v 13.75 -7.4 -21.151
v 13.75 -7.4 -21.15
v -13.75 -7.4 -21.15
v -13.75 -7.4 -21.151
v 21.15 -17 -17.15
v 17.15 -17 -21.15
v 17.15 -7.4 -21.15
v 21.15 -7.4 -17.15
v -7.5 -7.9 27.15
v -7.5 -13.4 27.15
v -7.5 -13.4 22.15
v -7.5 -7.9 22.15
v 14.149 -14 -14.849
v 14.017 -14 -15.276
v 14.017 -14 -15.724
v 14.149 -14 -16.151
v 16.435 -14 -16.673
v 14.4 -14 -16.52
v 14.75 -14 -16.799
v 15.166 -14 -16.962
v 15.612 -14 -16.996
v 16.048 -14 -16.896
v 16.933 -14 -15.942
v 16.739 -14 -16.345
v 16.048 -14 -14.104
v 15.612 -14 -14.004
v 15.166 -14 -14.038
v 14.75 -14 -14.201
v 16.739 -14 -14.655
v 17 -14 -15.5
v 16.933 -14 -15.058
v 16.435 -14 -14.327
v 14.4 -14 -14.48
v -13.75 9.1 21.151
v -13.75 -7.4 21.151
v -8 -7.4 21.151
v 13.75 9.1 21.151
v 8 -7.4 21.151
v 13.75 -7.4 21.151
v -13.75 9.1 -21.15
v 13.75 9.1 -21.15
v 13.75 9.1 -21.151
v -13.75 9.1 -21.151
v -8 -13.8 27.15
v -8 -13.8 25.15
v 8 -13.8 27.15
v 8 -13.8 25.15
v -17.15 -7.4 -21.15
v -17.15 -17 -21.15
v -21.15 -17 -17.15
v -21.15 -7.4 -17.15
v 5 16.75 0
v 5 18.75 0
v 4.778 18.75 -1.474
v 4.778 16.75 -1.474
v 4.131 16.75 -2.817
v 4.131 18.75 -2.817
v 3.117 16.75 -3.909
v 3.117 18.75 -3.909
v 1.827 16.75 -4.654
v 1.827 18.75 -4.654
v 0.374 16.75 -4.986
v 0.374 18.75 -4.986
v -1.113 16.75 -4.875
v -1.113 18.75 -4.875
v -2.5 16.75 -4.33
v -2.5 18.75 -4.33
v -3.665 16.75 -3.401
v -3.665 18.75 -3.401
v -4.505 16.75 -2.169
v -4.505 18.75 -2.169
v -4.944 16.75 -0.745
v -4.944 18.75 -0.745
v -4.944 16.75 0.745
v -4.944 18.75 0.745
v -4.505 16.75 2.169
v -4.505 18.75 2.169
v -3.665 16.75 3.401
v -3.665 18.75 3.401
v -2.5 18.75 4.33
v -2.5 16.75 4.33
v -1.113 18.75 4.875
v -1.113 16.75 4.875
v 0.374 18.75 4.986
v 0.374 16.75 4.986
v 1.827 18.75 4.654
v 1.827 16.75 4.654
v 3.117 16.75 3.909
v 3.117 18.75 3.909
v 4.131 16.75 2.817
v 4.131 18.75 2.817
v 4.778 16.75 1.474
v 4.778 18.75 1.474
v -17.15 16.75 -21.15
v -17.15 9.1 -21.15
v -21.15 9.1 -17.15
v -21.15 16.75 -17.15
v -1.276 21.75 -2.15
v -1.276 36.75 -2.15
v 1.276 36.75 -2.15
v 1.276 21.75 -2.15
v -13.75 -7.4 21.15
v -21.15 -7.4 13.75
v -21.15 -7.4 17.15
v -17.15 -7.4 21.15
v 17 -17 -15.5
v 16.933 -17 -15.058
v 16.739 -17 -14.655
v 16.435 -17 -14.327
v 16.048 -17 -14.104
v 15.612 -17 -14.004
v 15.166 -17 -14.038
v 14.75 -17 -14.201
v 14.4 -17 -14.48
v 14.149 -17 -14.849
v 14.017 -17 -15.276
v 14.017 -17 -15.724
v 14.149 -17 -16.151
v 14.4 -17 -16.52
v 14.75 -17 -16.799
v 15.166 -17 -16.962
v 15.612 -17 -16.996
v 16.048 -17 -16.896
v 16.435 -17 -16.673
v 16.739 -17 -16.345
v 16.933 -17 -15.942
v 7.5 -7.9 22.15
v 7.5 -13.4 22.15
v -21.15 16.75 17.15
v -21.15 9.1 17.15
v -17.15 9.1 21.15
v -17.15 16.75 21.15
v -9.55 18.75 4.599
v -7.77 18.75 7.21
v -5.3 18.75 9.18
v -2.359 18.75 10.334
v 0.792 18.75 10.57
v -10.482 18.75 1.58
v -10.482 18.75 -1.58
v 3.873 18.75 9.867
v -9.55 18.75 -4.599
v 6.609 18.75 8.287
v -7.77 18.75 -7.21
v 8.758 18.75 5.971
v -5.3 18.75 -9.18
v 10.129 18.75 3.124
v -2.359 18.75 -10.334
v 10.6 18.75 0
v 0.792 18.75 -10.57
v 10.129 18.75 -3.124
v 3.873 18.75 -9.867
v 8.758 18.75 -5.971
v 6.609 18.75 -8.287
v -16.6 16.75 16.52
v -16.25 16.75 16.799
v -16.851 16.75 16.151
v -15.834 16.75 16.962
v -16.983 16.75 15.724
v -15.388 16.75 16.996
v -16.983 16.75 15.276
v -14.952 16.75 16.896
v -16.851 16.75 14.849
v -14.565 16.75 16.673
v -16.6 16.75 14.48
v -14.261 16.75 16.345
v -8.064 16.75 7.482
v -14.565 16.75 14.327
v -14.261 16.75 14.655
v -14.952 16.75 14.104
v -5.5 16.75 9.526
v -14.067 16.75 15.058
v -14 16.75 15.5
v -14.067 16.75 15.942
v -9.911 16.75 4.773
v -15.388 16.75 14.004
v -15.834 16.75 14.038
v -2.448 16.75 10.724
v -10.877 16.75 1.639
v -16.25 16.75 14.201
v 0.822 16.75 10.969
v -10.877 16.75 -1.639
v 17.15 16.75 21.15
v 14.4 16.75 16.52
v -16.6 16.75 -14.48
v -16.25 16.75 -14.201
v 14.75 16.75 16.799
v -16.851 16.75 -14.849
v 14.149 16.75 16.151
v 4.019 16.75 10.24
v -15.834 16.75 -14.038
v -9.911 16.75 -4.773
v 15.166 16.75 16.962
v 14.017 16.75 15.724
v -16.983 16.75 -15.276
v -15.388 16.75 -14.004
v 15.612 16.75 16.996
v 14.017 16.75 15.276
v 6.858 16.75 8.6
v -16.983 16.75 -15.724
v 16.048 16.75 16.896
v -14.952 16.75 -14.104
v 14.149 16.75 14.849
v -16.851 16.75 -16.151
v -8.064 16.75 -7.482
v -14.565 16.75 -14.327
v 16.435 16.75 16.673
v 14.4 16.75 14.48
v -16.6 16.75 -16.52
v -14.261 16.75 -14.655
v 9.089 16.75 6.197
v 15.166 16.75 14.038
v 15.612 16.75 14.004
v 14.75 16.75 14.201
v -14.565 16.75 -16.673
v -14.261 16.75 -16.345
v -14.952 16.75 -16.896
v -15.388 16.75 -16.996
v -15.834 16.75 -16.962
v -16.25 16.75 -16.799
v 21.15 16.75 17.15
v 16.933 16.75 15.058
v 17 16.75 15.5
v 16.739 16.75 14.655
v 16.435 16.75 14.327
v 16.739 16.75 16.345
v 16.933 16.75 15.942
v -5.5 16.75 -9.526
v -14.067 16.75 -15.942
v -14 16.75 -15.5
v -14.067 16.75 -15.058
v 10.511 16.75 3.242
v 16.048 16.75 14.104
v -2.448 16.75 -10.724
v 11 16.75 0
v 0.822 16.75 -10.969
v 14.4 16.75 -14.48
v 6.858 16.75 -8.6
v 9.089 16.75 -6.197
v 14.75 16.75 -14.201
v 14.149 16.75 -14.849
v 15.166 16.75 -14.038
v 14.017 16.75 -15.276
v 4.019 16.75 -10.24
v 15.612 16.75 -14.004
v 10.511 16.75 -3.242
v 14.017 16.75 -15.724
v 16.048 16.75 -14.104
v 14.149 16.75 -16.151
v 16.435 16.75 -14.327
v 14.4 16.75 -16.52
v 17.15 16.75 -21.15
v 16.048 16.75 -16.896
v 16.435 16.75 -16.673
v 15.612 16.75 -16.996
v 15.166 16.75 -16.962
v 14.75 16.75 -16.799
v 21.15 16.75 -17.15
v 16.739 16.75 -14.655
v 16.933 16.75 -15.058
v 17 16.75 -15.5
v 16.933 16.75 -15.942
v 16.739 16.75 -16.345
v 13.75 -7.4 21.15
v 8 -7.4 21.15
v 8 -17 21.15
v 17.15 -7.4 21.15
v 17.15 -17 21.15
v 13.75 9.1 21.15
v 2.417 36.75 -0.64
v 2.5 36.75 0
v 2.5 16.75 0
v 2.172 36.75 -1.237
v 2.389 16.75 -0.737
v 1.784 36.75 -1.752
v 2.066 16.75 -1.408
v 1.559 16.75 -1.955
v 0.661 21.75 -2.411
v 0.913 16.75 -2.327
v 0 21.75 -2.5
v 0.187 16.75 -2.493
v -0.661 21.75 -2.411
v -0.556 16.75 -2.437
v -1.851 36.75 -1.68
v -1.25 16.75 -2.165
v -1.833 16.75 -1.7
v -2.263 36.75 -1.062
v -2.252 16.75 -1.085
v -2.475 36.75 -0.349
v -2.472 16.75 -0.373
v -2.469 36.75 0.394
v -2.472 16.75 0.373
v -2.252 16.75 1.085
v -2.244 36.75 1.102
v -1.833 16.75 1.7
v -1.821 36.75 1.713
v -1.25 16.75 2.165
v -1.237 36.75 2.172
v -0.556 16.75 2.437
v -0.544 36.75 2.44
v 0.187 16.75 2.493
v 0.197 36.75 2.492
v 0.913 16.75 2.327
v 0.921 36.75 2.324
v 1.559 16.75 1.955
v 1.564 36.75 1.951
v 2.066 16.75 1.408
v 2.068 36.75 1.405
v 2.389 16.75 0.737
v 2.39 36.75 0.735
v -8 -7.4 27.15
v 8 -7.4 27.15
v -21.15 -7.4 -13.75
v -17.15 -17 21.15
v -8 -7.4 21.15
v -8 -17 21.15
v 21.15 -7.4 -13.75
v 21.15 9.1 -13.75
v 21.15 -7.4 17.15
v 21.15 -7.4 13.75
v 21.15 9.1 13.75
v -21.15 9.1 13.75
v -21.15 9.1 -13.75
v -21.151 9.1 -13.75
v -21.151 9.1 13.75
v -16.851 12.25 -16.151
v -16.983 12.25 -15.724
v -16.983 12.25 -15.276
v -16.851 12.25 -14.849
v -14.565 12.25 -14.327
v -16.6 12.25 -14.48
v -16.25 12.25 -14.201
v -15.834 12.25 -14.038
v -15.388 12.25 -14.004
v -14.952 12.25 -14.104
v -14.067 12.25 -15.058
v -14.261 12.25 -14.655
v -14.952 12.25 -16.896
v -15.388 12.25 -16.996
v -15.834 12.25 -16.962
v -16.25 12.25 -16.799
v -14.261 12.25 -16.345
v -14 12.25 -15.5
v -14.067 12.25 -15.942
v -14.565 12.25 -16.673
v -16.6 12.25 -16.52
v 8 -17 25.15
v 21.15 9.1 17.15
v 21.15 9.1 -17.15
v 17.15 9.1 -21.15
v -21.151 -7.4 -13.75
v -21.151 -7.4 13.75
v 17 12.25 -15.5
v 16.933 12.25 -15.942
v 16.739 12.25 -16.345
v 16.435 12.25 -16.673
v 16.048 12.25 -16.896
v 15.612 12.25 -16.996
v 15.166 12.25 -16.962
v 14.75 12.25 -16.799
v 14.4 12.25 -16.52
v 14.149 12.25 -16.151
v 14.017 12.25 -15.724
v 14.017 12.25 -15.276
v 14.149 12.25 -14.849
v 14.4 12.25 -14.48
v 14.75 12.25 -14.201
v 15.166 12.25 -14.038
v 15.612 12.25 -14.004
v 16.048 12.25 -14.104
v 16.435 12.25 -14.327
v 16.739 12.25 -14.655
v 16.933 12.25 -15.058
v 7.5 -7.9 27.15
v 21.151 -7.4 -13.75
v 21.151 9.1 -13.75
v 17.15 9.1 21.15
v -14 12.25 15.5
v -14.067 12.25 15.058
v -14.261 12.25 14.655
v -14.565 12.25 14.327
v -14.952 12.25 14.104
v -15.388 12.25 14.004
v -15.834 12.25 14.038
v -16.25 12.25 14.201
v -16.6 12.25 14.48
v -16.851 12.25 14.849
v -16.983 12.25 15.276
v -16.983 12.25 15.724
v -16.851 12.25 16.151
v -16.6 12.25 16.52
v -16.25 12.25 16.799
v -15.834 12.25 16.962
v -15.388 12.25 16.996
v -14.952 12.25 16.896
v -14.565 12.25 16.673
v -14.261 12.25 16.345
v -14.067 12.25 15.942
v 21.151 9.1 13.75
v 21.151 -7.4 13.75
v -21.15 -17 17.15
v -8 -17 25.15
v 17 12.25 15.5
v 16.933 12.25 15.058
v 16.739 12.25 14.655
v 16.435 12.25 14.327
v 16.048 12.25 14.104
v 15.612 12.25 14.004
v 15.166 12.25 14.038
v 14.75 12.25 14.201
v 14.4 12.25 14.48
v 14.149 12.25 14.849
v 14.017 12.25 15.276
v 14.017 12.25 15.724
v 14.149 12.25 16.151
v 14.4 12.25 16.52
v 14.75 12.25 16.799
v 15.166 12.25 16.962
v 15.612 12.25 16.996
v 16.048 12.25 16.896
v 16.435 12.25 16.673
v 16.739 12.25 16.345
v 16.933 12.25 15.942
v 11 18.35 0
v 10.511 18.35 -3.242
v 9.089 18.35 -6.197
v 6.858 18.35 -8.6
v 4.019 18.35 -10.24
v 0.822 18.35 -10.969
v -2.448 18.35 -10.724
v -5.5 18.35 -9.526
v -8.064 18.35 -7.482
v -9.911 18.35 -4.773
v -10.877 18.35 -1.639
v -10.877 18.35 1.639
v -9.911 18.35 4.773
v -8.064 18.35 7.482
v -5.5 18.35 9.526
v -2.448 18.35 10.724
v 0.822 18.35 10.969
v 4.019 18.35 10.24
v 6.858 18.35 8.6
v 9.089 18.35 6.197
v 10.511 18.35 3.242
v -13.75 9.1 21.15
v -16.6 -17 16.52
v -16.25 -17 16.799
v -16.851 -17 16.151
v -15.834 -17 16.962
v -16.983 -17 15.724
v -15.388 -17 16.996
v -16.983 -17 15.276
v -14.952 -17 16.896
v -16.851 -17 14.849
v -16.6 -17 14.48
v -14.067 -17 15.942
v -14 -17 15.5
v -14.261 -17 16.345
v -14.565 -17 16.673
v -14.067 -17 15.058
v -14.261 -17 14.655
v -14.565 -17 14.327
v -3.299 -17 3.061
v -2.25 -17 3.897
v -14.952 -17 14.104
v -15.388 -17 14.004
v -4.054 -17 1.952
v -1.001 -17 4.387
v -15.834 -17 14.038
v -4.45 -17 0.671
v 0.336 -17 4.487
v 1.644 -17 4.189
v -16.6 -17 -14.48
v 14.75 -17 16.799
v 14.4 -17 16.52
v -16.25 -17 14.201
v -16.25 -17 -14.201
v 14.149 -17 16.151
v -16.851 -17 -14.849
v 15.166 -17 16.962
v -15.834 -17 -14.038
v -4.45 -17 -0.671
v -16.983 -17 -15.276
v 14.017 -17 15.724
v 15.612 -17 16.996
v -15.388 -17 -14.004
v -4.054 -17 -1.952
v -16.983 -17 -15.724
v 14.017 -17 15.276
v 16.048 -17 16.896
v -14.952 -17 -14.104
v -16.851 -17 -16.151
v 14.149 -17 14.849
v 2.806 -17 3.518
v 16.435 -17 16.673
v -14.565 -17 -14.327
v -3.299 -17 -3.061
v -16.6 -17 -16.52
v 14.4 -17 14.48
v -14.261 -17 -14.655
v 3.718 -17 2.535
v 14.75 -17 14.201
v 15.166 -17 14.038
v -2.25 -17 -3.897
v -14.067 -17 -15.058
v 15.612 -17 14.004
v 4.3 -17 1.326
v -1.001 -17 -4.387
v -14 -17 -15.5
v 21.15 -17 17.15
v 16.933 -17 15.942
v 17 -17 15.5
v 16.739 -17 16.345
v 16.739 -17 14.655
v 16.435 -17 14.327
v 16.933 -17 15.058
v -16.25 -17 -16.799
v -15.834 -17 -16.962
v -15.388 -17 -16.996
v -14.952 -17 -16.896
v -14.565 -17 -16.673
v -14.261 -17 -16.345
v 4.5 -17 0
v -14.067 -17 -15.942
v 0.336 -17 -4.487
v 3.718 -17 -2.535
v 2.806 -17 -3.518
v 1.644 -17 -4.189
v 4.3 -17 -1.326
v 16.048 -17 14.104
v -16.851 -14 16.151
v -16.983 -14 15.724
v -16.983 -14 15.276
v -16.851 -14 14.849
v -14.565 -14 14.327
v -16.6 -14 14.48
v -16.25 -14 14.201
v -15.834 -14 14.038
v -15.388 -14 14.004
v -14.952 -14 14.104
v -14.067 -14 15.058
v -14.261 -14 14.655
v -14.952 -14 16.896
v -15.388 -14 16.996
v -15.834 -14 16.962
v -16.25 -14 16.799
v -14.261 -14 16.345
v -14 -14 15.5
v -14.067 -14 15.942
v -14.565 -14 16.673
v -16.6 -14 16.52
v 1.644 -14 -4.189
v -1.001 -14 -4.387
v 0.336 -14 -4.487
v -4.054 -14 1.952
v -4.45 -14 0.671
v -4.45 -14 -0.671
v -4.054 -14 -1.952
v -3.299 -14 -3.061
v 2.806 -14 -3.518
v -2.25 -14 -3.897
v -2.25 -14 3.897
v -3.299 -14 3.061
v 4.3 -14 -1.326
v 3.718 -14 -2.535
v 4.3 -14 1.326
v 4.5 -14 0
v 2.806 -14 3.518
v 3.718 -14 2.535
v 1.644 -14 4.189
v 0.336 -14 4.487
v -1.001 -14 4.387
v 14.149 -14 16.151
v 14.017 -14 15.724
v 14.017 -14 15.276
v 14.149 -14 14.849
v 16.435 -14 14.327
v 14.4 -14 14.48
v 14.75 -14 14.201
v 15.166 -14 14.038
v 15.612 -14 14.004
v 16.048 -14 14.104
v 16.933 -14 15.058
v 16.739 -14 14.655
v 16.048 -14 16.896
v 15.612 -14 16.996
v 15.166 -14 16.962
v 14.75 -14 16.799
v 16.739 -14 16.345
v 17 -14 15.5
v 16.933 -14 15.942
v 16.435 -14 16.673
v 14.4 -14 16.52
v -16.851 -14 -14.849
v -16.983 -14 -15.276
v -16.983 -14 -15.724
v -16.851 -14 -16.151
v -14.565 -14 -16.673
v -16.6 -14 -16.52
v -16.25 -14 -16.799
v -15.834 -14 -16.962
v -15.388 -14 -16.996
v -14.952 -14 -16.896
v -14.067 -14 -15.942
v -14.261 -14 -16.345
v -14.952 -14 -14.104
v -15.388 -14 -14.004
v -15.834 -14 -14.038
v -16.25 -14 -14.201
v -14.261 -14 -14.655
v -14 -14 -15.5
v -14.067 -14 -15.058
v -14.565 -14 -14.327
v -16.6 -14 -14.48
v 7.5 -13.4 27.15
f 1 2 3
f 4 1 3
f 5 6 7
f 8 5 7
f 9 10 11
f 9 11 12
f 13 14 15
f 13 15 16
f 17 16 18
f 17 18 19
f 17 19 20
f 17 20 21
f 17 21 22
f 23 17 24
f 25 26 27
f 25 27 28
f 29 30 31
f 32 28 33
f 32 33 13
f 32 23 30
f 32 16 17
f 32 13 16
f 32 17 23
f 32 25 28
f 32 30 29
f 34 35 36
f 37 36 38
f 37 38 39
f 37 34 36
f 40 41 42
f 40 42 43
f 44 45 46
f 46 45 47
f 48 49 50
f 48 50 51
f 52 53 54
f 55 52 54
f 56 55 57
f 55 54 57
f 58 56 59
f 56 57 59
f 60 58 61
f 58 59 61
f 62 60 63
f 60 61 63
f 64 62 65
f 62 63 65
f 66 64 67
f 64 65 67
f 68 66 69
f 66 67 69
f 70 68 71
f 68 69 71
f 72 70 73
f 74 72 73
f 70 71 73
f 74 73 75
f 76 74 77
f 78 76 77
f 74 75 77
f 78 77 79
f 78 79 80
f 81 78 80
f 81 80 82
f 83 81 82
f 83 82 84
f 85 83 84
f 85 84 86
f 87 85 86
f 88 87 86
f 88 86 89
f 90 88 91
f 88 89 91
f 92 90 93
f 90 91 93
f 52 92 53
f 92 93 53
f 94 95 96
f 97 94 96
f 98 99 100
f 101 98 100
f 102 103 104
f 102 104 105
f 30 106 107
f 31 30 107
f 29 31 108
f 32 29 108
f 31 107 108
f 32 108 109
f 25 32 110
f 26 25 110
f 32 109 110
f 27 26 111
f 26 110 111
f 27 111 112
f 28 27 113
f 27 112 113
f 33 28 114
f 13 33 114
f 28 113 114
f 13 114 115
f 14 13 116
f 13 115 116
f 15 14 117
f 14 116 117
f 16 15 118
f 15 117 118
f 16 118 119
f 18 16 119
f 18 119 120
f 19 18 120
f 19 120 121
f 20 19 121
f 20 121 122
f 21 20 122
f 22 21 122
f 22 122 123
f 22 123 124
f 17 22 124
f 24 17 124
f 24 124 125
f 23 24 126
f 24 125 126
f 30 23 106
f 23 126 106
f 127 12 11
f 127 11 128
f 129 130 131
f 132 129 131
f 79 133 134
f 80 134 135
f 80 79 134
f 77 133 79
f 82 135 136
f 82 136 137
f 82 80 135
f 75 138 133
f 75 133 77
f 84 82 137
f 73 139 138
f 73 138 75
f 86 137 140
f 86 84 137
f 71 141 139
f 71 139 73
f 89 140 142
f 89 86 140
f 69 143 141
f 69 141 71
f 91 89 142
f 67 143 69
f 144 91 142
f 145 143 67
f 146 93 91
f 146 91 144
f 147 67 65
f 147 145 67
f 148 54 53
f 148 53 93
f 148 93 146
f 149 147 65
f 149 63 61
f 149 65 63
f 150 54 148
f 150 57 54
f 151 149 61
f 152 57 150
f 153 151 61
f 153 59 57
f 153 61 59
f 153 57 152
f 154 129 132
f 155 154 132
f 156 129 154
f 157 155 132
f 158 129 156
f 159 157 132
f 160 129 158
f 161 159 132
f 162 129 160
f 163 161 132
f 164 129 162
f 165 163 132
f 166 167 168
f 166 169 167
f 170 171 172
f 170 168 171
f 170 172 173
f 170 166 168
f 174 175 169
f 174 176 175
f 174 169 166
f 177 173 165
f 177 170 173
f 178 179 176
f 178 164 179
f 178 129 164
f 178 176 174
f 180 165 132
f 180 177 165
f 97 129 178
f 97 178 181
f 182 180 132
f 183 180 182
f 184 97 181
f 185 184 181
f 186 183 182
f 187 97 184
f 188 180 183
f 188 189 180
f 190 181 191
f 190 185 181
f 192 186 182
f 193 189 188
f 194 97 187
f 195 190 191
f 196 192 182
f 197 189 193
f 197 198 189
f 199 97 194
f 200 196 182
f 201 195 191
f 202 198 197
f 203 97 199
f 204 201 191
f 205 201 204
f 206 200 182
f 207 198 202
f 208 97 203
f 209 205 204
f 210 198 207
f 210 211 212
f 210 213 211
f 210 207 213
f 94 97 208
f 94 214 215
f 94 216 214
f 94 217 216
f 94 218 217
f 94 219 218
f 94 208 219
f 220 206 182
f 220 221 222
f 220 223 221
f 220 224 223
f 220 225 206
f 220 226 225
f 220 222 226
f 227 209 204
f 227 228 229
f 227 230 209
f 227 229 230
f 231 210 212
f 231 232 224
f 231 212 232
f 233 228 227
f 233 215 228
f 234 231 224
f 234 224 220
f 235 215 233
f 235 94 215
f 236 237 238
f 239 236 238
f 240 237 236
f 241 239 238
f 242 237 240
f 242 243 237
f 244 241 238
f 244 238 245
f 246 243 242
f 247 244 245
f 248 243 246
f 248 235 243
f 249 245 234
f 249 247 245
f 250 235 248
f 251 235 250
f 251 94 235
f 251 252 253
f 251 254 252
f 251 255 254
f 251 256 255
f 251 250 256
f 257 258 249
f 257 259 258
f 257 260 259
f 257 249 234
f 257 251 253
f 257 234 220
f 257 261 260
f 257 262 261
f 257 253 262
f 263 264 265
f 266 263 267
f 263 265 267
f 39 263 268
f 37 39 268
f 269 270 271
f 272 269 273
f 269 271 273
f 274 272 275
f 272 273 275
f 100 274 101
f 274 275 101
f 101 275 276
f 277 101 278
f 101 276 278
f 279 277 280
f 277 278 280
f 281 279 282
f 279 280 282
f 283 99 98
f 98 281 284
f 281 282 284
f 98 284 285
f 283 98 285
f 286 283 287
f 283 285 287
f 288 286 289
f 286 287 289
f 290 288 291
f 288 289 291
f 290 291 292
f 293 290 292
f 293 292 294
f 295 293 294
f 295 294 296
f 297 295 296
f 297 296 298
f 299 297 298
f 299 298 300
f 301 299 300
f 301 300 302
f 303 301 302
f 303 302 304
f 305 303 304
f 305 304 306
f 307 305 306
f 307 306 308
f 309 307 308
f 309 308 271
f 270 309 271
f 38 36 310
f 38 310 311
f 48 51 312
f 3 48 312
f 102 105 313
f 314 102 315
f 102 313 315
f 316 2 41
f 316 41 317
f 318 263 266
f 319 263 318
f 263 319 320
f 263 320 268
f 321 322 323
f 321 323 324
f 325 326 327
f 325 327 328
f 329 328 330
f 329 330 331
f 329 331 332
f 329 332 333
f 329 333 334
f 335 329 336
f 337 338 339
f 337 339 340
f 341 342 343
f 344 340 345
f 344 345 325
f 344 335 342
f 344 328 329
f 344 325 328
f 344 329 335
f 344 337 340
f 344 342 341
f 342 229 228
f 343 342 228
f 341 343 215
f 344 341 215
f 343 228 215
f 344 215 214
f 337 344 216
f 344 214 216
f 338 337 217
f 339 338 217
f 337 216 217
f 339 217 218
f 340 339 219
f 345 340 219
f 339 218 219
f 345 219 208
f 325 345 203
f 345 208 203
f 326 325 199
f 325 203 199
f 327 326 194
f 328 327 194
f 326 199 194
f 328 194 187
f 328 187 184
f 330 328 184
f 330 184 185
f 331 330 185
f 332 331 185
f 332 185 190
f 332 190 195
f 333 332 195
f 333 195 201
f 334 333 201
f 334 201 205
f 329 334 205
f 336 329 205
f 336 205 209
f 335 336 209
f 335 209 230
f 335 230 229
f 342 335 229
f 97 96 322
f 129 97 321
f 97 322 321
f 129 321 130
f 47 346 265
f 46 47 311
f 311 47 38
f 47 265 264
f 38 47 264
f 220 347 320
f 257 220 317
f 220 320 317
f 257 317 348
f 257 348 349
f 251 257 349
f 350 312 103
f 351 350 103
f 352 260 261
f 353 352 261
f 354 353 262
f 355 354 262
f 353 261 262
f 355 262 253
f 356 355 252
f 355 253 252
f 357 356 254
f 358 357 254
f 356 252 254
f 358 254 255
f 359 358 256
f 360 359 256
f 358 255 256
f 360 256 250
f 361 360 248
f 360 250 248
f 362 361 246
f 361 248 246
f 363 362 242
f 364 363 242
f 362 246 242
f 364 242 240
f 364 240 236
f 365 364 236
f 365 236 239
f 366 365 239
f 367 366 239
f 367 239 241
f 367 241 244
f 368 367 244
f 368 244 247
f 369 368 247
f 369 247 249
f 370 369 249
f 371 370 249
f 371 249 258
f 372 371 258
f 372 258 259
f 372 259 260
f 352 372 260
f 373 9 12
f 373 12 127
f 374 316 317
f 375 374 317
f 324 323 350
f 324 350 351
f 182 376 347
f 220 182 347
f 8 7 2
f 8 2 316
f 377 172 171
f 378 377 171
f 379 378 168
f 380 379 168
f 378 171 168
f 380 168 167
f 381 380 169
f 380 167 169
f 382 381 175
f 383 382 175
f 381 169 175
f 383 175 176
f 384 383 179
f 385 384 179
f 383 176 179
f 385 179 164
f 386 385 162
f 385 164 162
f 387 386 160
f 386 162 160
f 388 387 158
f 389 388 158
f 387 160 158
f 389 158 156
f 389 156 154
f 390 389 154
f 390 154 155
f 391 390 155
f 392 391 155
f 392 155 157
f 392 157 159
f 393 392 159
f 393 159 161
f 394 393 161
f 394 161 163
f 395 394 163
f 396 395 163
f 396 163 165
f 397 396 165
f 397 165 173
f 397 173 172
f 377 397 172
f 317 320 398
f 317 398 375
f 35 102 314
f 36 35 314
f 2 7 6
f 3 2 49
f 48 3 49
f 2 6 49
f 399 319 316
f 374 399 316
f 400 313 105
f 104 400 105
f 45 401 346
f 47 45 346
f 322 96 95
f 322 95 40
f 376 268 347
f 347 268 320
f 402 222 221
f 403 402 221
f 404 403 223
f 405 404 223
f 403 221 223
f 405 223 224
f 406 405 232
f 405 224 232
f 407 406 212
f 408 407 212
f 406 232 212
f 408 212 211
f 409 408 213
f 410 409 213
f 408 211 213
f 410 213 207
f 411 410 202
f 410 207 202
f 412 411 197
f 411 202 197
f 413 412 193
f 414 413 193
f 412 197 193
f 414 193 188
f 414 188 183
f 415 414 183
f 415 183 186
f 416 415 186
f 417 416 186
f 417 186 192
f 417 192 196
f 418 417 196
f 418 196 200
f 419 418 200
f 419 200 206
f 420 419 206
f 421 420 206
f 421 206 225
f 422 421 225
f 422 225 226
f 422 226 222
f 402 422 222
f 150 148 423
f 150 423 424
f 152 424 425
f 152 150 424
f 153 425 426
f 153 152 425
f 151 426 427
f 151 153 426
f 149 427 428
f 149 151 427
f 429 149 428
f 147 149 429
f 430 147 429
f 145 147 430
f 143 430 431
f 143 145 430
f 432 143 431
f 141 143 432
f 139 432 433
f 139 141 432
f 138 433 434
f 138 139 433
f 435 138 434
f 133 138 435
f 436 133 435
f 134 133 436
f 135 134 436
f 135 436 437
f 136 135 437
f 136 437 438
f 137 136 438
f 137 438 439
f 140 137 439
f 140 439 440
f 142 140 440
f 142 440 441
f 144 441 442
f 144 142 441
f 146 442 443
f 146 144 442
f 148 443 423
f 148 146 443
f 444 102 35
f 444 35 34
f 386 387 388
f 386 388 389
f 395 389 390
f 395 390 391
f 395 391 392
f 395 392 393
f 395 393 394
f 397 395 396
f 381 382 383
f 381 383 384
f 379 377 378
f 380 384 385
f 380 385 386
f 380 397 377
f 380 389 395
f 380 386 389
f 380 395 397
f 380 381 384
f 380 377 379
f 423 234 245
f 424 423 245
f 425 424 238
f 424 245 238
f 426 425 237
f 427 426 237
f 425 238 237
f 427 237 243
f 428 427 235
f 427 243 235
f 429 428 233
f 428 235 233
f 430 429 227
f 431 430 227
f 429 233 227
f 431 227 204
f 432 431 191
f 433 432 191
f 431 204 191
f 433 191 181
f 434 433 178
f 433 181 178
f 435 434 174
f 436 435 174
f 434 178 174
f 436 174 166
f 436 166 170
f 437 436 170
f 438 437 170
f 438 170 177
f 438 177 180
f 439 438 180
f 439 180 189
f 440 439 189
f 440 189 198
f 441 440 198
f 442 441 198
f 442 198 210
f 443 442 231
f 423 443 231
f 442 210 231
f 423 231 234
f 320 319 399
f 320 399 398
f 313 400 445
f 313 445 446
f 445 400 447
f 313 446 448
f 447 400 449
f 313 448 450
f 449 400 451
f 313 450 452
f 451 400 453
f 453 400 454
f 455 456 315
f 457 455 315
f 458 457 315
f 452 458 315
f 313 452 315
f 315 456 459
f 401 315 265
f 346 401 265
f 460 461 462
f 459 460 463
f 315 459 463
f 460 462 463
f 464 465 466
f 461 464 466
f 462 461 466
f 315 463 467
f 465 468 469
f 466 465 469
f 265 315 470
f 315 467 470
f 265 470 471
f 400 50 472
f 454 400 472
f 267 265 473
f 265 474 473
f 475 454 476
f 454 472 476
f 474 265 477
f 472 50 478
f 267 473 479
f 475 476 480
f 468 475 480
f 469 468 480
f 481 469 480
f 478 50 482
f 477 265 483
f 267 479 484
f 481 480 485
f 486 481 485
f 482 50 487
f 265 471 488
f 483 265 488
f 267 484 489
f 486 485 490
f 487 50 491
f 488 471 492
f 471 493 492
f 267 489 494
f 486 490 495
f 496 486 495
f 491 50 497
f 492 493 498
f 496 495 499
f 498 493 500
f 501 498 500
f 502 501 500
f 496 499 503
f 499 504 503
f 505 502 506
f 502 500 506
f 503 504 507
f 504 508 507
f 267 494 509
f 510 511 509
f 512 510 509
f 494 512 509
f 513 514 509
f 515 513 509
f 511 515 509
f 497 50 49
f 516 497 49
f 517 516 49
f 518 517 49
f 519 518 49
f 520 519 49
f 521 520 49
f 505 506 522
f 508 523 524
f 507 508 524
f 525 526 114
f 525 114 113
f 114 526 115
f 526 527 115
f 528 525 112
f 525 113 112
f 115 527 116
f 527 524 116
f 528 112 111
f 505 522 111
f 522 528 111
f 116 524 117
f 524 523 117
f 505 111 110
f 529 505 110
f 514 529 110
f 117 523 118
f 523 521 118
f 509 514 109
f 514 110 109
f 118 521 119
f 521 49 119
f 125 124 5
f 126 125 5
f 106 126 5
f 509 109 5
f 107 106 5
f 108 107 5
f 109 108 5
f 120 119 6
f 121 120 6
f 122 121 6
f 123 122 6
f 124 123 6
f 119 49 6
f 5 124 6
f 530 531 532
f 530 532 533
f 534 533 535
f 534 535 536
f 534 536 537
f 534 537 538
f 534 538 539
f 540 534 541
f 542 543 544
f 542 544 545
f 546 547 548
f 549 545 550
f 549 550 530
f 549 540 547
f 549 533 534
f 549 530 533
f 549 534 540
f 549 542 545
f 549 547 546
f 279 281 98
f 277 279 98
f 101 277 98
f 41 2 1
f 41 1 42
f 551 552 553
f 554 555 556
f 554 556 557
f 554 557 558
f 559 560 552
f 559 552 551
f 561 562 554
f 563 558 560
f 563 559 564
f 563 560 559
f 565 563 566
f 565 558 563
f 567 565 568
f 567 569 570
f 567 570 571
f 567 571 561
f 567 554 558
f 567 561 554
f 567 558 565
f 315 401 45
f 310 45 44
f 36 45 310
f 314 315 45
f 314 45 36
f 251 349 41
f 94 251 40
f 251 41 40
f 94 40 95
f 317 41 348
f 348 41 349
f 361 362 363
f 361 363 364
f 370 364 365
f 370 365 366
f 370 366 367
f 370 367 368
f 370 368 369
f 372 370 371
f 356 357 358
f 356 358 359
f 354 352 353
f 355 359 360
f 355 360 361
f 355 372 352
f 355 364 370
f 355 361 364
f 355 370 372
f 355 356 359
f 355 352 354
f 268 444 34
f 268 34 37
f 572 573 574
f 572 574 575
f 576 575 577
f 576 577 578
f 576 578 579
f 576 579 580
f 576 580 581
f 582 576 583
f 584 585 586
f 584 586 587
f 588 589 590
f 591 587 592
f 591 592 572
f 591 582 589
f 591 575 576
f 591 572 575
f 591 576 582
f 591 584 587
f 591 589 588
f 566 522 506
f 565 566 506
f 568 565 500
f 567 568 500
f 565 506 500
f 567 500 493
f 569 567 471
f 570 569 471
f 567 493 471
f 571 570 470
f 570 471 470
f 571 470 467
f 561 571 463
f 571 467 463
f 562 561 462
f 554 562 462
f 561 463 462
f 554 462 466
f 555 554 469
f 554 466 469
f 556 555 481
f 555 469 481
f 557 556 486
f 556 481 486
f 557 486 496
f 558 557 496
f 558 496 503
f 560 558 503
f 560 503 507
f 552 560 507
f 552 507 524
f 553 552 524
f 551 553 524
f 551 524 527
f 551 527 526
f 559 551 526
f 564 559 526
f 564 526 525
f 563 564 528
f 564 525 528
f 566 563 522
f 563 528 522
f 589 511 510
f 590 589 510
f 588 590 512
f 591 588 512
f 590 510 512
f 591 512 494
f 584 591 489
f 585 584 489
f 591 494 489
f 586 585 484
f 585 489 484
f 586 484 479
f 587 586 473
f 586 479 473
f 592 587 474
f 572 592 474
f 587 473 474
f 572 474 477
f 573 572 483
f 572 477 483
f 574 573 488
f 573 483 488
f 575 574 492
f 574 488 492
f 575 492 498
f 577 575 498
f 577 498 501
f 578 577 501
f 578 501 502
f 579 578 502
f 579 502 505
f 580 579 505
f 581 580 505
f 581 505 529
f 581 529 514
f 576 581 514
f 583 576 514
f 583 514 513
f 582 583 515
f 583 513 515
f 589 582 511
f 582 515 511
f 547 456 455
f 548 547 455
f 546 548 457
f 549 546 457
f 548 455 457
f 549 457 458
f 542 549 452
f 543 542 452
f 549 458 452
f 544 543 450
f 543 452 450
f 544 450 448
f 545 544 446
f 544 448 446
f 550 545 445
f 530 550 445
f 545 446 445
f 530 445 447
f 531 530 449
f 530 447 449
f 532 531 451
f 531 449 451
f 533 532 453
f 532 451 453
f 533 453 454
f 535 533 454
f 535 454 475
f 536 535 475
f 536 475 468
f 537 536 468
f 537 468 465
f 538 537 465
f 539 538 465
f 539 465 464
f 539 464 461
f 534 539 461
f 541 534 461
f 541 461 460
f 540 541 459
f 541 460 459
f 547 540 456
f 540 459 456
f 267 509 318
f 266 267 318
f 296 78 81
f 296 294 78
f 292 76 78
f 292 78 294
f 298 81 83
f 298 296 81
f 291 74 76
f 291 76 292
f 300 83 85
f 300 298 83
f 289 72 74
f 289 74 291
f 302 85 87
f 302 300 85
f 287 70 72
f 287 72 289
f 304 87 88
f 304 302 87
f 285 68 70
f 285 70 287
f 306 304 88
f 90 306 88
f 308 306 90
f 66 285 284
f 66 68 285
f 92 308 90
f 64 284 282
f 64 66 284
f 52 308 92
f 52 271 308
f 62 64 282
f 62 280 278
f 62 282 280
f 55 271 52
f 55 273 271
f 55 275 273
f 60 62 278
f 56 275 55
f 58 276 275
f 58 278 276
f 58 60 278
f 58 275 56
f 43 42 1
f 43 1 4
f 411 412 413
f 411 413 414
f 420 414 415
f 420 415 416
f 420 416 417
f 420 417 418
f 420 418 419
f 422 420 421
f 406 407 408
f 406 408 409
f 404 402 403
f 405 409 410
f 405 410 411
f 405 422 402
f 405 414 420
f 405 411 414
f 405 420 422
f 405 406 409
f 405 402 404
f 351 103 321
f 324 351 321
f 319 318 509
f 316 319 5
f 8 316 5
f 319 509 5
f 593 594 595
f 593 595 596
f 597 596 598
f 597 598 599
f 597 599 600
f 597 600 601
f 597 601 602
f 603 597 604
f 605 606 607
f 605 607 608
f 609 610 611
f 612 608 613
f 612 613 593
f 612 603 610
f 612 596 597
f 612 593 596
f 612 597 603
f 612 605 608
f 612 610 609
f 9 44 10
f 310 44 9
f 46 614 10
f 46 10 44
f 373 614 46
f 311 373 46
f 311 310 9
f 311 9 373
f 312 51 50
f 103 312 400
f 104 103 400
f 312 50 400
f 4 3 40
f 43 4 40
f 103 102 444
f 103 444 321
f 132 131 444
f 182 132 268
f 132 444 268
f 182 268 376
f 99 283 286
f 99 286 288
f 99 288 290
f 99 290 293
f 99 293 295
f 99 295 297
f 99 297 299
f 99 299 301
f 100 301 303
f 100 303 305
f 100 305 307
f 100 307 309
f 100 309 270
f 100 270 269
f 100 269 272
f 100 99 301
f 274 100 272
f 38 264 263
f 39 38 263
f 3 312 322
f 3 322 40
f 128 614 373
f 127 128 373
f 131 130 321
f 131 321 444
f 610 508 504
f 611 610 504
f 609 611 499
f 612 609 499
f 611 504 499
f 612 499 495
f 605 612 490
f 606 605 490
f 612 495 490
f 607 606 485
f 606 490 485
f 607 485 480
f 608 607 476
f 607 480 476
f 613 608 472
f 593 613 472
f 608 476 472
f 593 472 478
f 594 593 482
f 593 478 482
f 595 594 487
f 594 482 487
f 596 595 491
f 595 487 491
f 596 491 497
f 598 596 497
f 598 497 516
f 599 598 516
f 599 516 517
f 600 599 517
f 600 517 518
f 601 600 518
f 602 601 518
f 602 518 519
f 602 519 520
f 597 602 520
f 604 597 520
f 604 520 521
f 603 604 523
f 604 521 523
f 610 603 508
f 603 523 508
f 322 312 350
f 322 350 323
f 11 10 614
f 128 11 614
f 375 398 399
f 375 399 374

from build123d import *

# Parameters (mm, degrees)
EXTRUDE1_START       = -17
SKETCH1_W            = 42.3
SKETCH1_H            = 42.3
EXTRUDE1_DEPTH       = 9.6
CHAMFER3_SIZE        = 4
BOSS_EXTRUDE8_DEPTH  = 16.5
BOSS_EXTRUDE9_DEPTH  = 7.65
SKETCH33_R           = 11
BOSS_EXTRUDE10_DEPTH = 2
SKETCH34_R           = 5
CUT_EXTRUDE1_DEPTH   = 2
SKETCH35_R           = 2.5
BOSS_EXTRUDE11_DEPTH = 20
CUT_EXTRUDE3_DEPTH   = 15
SKETCH37_W           = 27.5
SKETCH37_H           = 16.5
BOSS_EXTRUDE12_DEPTH = 0.001
SKETCH38_W           = 27.5
SKETCH38_H           = 16.5
BOSS_EXTRUDE13_DEPTH = 0.001
SKETCH39_W           = 27.5
SKETCH39_H           = 16.5
BOSS_EXTRUDE14_DEPTH = 0.001
SKETCH40_W           = 27.5
SKETCH40_H           = 16.5
BOSS_EXTRUDE15_DEPTH = 0.001
SKETCH41_R           = 1.5
CUT_EXTRUDE4_DEPTH   = 6
SKETCH42_R           = 4.5
SKETCH42_R_2         = 1.5
CUT_EXTRUDE5_DEPTH   = 3
SKETCH43_W           = 16
SKETCH43_H           = 4
BOSS_EXTRUDE16_DEPTH = 3.2
SKETCH44_W           = 16
SKETCH44_H           = 6.4
BOSS_EXTRUDE17_DEPTH = 6
SKETCH45_W           = 15
SKETCH45_H           = 5.5
CUT_EXTRUDE6_DEPTH   = 5
SKETCH46_R           = 1.5
BOSS_EXTRUDE18_DEPTH = 1.5
CHAMFER4_SIZE        = 0.4


with BuildPart() as part:
    # Sketch1 → Extrude1 (new body)
    with BuildSketch(Plane(origin=(0, 0, 0), x_dir=(1, 0, 0), z_dir=(0, 1, 0)).offset(EXTRUDE1_START)):
        Rectangle(SKETCH1_W, SKETCH1_H)
    extrude(amount=EXTRUDE1_DEPTH)

    # Chamfer3
    chamfer3_edges = [part.edges().sort_by_distance(p)[0] for p in [
        (-21.15, -12.2, -21.15),
        (21.15, -12.2, -21.15),
        (21.15, -12.2, 21.15),
        (-21.15, -12.2, 21.15),
    ]]
    chamfer(chamfer3_edges, length=CHAMFER3_SIZE)

    # Sketch31 → Boss-Extrude8 (add)
    with BuildSketch(Plane(origin=(0, -7.4, 0), x_dir=(1, 0, 0), z_dir=(0, 1, 0))):
        Polygon((-13.75, 21.15), (13.75, 21.15), (21.15, 13.75), (21.15, -13.75), (13.75, -21.15), (-13.75, -21.15), (-21.15, -13.75), (-21.15, 13.75), align=None)
    extrude(amount=BOSS_EXTRUDE8_DEPTH)

    # Sketch32 → Boss-Extrude9 (add)
    with BuildSketch(Plane(origin=(0, 9.1, 0), x_dir=(1, 0, 0), z_dir=(0, 1, 0))):
        Polygon((-17.15, 21.15), (-21.15, 17.15), (-21.15, 13.75), (-21.15, -13.75), (-21.15, -17.15), (-17.15, -21.15), (-13.75, -21.15), (13.75, -21.15), (17.15, -21.15), (21.15, -17.15), (21.15, -13.75), (21.15, 13.75), (21.15, 17.15), (17.15, 21.15), (13.75, 21.15), (-13.75, 21.15), align=None)
    extrude(amount=BOSS_EXTRUDE9_DEPTH)

    # Sketch33 → Boss-Extrude10 (add)
    with BuildSketch(Plane(origin=(0, 16.75, 0), x_dir=(1, 0, 0), z_dir=(0, 1, 0))):
        Circle(SKETCH33_R)
    extrude(amount=BOSS_EXTRUDE10_DEPTH)

    # Sketch34 → Cut-Extrude1 (cut)
    with BuildSketch(Plane(origin=(0, 18.75, 0), x_dir=(1, 0, 0), z_dir=(0, 1, 0))):
        Circle(SKETCH34_R)
    extrude(amount=-CUT_EXTRUDE1_DEPTH, mode=Mode.SUBTRACT)

    # Sketch35 → Boss-Extrude11 (add)
    with BuildSketch(Plane(origin=(0, 16.75, 0), x_dir=(1, 0, 0), z_dir=(0, 1, 0))):
        Circle(SKETCH35_R)
    extrude(amount=BOSS_EXTRUDE11_DEPTH)

    # Sketch36 → Cut-Extrude3 (cut)
    with BuildSketch(Plane(origin=(0, 36.75, 0), x_dir=(1, 0, 0), z_dir=(0, 1, 0))):
        with BuildLine():
            Line((-1.275735082, 2.15), (0, 2.15))
            Line((0, 2.15), (1.275735082, 2.15))
            ThreePointArc((1.275735082, 2.15), (0, 2.5), (-1.275735082, 2.15))
        make_face()
    extrude(amount=-CUT_EXTRUDE3_DEPTH, mode=Mode.SUBTRACT)

    # Sketch37 → Boss-Extrude12 (add)
    with BuildSketch(Plane(origin=(21.15, 0, 0), x_dir=(0, 0, -1), z_dir=(1, 0, 0))):
        with Locations((0, 0.85)):
            Rectangle(SKETCH37_W, SKETCH37_H)
    extrude(amount=BOSS_EXTRUDE12_DEPTH)

    # Sketch38 → Boss-Extrude13 (add)
    with BuildSketch(Plane.XY.offset(21.15)):
        with Locations((0, 0.85)):
            Rectangle(SKETCH38_W, SKETCH38_H)
    extrude(amount=BOSS_EXTRUDE13_DEPTH)

    # Sketch39 → Boss-Extrude14 (add)
    with BuildSketch(Plane.ZY.offset(21.15)):
        with Locations((0, 0.85)):
            Rectangle(SKETCH39_W, SKETCH39_H)
    extrude(amount=BOSS_EXTRUDE14_DEPTH)

    # Sketch40 → Boss-Extrude15 (add)
    with BuildSketch(Plane(origin=(0, 0, -21.15), x_dir=(-1, 0, 0), z_dir=(0, 0, -1))):
        with Locations((0, 0.85)):
            Rectangle(SKETCH40_W, SKETCH40_H)
    extrude(amount=BOSS_EXTRUDE15_DEPTH)

    # Sketch41 → Cut-Extrude4 (cut)
    with BuildSketch(Plane(origin=(0, 16.75, 0), x_dir=(1, 0, 0), z_dir=(0, 1, 0))):
        with Locations((-15.5, 15.5)):
            Circle(SKETCH41_R)
        with Locations((-15.5, -15.5)):
            Circle(SKETCH41_R)
        with Locations((15.5, -15.5)):
            Circle(SKETCH41_R)
        with Locations((15.5, 15.5)):
            Circle(SKETCH41_R)
    extrude(amount=-CUT_EXTRUDE4_DEPTH, mode=Mode.SUBTRACT)

    # Sketch42 → Cut-Extrude5 (cut)
    with BuildSketch(Plane.XZ.offset(17)):
        Circle(SKETCH42_R)
        with Locations((-15.5, 15.5)):
            Circle(SKETCH42_R_2)
        with Locations((15.5, 15.5)):
            Circle(SKETCH42_R_2)
        with Locations((15.5, -15.5)):
            Circle(SKETCH42_R_2)
        with Locations((-15.5, -15.5)):
            Circle(SKETCH42_R_2)
    extrude(amount=-CUT_EXTRUDE5_DEPTH, mode=Mode.SUBTRACT)

    # Sketch43 → Boss-Extrude16 (add)
    with BuildSketch(Plane.XZ.offset(17)):
        with Locations((0, 23.15)):
            Rectangle(SKETCH43_W, SKETCH43_H)
    extrude(amount=-BOSS_EXTRUDE16_DEPTH)

    # Sketch44 → Boss-Extrude17 (add)
    with BuildSketch(Plane.XY.offset(21.15)):
        with Locations((0, -10.6)):
            Rectangle(SKETCH44_W, SKETCH44_H)
    extrude(amount=BOSS_EXTRUDE17_DEPTH)

    # Sketch45 → Cut-Extrude6 (cut)
    with BuildSketch(Plane.XY.offset(27.15)):
        with Locations((0, -10.65)):
            Rectangle(SKETCH45_W, SKETCH45_H)
    extrude(amount=-CUT_EXTRUDE6_DEPTH, mode=Mode.SUBTRACT)

    # Sketch46 → Boss-Extrude18 (add)
    with BuildSketch(Plane(origin=(0, 10.75, 0), x_dir=(1, 0, 0), z_dir=(0, 1, 0))):
        with Locations((-15.5, -15.5)):
            Circle(SKETCH46_R)
        with Locations((-15.5, 15.5)):
            Circle(SKETCH46_R)
        with Locations((15.5, 15.5)):
            Circle(SKETCH46_R)
        with Locations((15.5, -15.5)):
            Circle(SKETCH46_R)
    extrude(amount=BOSS_EXTRUDE18_DEPTH)

    # Chamfer4
    chamfer4_edges = [part.edges().sort_by_distance(p)[0] for p in [
        (-11, 18.75, 0),
    ]]
    chamfer(chamfer4_edges, length=CHAMFER4_SIZE)


solid = part.part
